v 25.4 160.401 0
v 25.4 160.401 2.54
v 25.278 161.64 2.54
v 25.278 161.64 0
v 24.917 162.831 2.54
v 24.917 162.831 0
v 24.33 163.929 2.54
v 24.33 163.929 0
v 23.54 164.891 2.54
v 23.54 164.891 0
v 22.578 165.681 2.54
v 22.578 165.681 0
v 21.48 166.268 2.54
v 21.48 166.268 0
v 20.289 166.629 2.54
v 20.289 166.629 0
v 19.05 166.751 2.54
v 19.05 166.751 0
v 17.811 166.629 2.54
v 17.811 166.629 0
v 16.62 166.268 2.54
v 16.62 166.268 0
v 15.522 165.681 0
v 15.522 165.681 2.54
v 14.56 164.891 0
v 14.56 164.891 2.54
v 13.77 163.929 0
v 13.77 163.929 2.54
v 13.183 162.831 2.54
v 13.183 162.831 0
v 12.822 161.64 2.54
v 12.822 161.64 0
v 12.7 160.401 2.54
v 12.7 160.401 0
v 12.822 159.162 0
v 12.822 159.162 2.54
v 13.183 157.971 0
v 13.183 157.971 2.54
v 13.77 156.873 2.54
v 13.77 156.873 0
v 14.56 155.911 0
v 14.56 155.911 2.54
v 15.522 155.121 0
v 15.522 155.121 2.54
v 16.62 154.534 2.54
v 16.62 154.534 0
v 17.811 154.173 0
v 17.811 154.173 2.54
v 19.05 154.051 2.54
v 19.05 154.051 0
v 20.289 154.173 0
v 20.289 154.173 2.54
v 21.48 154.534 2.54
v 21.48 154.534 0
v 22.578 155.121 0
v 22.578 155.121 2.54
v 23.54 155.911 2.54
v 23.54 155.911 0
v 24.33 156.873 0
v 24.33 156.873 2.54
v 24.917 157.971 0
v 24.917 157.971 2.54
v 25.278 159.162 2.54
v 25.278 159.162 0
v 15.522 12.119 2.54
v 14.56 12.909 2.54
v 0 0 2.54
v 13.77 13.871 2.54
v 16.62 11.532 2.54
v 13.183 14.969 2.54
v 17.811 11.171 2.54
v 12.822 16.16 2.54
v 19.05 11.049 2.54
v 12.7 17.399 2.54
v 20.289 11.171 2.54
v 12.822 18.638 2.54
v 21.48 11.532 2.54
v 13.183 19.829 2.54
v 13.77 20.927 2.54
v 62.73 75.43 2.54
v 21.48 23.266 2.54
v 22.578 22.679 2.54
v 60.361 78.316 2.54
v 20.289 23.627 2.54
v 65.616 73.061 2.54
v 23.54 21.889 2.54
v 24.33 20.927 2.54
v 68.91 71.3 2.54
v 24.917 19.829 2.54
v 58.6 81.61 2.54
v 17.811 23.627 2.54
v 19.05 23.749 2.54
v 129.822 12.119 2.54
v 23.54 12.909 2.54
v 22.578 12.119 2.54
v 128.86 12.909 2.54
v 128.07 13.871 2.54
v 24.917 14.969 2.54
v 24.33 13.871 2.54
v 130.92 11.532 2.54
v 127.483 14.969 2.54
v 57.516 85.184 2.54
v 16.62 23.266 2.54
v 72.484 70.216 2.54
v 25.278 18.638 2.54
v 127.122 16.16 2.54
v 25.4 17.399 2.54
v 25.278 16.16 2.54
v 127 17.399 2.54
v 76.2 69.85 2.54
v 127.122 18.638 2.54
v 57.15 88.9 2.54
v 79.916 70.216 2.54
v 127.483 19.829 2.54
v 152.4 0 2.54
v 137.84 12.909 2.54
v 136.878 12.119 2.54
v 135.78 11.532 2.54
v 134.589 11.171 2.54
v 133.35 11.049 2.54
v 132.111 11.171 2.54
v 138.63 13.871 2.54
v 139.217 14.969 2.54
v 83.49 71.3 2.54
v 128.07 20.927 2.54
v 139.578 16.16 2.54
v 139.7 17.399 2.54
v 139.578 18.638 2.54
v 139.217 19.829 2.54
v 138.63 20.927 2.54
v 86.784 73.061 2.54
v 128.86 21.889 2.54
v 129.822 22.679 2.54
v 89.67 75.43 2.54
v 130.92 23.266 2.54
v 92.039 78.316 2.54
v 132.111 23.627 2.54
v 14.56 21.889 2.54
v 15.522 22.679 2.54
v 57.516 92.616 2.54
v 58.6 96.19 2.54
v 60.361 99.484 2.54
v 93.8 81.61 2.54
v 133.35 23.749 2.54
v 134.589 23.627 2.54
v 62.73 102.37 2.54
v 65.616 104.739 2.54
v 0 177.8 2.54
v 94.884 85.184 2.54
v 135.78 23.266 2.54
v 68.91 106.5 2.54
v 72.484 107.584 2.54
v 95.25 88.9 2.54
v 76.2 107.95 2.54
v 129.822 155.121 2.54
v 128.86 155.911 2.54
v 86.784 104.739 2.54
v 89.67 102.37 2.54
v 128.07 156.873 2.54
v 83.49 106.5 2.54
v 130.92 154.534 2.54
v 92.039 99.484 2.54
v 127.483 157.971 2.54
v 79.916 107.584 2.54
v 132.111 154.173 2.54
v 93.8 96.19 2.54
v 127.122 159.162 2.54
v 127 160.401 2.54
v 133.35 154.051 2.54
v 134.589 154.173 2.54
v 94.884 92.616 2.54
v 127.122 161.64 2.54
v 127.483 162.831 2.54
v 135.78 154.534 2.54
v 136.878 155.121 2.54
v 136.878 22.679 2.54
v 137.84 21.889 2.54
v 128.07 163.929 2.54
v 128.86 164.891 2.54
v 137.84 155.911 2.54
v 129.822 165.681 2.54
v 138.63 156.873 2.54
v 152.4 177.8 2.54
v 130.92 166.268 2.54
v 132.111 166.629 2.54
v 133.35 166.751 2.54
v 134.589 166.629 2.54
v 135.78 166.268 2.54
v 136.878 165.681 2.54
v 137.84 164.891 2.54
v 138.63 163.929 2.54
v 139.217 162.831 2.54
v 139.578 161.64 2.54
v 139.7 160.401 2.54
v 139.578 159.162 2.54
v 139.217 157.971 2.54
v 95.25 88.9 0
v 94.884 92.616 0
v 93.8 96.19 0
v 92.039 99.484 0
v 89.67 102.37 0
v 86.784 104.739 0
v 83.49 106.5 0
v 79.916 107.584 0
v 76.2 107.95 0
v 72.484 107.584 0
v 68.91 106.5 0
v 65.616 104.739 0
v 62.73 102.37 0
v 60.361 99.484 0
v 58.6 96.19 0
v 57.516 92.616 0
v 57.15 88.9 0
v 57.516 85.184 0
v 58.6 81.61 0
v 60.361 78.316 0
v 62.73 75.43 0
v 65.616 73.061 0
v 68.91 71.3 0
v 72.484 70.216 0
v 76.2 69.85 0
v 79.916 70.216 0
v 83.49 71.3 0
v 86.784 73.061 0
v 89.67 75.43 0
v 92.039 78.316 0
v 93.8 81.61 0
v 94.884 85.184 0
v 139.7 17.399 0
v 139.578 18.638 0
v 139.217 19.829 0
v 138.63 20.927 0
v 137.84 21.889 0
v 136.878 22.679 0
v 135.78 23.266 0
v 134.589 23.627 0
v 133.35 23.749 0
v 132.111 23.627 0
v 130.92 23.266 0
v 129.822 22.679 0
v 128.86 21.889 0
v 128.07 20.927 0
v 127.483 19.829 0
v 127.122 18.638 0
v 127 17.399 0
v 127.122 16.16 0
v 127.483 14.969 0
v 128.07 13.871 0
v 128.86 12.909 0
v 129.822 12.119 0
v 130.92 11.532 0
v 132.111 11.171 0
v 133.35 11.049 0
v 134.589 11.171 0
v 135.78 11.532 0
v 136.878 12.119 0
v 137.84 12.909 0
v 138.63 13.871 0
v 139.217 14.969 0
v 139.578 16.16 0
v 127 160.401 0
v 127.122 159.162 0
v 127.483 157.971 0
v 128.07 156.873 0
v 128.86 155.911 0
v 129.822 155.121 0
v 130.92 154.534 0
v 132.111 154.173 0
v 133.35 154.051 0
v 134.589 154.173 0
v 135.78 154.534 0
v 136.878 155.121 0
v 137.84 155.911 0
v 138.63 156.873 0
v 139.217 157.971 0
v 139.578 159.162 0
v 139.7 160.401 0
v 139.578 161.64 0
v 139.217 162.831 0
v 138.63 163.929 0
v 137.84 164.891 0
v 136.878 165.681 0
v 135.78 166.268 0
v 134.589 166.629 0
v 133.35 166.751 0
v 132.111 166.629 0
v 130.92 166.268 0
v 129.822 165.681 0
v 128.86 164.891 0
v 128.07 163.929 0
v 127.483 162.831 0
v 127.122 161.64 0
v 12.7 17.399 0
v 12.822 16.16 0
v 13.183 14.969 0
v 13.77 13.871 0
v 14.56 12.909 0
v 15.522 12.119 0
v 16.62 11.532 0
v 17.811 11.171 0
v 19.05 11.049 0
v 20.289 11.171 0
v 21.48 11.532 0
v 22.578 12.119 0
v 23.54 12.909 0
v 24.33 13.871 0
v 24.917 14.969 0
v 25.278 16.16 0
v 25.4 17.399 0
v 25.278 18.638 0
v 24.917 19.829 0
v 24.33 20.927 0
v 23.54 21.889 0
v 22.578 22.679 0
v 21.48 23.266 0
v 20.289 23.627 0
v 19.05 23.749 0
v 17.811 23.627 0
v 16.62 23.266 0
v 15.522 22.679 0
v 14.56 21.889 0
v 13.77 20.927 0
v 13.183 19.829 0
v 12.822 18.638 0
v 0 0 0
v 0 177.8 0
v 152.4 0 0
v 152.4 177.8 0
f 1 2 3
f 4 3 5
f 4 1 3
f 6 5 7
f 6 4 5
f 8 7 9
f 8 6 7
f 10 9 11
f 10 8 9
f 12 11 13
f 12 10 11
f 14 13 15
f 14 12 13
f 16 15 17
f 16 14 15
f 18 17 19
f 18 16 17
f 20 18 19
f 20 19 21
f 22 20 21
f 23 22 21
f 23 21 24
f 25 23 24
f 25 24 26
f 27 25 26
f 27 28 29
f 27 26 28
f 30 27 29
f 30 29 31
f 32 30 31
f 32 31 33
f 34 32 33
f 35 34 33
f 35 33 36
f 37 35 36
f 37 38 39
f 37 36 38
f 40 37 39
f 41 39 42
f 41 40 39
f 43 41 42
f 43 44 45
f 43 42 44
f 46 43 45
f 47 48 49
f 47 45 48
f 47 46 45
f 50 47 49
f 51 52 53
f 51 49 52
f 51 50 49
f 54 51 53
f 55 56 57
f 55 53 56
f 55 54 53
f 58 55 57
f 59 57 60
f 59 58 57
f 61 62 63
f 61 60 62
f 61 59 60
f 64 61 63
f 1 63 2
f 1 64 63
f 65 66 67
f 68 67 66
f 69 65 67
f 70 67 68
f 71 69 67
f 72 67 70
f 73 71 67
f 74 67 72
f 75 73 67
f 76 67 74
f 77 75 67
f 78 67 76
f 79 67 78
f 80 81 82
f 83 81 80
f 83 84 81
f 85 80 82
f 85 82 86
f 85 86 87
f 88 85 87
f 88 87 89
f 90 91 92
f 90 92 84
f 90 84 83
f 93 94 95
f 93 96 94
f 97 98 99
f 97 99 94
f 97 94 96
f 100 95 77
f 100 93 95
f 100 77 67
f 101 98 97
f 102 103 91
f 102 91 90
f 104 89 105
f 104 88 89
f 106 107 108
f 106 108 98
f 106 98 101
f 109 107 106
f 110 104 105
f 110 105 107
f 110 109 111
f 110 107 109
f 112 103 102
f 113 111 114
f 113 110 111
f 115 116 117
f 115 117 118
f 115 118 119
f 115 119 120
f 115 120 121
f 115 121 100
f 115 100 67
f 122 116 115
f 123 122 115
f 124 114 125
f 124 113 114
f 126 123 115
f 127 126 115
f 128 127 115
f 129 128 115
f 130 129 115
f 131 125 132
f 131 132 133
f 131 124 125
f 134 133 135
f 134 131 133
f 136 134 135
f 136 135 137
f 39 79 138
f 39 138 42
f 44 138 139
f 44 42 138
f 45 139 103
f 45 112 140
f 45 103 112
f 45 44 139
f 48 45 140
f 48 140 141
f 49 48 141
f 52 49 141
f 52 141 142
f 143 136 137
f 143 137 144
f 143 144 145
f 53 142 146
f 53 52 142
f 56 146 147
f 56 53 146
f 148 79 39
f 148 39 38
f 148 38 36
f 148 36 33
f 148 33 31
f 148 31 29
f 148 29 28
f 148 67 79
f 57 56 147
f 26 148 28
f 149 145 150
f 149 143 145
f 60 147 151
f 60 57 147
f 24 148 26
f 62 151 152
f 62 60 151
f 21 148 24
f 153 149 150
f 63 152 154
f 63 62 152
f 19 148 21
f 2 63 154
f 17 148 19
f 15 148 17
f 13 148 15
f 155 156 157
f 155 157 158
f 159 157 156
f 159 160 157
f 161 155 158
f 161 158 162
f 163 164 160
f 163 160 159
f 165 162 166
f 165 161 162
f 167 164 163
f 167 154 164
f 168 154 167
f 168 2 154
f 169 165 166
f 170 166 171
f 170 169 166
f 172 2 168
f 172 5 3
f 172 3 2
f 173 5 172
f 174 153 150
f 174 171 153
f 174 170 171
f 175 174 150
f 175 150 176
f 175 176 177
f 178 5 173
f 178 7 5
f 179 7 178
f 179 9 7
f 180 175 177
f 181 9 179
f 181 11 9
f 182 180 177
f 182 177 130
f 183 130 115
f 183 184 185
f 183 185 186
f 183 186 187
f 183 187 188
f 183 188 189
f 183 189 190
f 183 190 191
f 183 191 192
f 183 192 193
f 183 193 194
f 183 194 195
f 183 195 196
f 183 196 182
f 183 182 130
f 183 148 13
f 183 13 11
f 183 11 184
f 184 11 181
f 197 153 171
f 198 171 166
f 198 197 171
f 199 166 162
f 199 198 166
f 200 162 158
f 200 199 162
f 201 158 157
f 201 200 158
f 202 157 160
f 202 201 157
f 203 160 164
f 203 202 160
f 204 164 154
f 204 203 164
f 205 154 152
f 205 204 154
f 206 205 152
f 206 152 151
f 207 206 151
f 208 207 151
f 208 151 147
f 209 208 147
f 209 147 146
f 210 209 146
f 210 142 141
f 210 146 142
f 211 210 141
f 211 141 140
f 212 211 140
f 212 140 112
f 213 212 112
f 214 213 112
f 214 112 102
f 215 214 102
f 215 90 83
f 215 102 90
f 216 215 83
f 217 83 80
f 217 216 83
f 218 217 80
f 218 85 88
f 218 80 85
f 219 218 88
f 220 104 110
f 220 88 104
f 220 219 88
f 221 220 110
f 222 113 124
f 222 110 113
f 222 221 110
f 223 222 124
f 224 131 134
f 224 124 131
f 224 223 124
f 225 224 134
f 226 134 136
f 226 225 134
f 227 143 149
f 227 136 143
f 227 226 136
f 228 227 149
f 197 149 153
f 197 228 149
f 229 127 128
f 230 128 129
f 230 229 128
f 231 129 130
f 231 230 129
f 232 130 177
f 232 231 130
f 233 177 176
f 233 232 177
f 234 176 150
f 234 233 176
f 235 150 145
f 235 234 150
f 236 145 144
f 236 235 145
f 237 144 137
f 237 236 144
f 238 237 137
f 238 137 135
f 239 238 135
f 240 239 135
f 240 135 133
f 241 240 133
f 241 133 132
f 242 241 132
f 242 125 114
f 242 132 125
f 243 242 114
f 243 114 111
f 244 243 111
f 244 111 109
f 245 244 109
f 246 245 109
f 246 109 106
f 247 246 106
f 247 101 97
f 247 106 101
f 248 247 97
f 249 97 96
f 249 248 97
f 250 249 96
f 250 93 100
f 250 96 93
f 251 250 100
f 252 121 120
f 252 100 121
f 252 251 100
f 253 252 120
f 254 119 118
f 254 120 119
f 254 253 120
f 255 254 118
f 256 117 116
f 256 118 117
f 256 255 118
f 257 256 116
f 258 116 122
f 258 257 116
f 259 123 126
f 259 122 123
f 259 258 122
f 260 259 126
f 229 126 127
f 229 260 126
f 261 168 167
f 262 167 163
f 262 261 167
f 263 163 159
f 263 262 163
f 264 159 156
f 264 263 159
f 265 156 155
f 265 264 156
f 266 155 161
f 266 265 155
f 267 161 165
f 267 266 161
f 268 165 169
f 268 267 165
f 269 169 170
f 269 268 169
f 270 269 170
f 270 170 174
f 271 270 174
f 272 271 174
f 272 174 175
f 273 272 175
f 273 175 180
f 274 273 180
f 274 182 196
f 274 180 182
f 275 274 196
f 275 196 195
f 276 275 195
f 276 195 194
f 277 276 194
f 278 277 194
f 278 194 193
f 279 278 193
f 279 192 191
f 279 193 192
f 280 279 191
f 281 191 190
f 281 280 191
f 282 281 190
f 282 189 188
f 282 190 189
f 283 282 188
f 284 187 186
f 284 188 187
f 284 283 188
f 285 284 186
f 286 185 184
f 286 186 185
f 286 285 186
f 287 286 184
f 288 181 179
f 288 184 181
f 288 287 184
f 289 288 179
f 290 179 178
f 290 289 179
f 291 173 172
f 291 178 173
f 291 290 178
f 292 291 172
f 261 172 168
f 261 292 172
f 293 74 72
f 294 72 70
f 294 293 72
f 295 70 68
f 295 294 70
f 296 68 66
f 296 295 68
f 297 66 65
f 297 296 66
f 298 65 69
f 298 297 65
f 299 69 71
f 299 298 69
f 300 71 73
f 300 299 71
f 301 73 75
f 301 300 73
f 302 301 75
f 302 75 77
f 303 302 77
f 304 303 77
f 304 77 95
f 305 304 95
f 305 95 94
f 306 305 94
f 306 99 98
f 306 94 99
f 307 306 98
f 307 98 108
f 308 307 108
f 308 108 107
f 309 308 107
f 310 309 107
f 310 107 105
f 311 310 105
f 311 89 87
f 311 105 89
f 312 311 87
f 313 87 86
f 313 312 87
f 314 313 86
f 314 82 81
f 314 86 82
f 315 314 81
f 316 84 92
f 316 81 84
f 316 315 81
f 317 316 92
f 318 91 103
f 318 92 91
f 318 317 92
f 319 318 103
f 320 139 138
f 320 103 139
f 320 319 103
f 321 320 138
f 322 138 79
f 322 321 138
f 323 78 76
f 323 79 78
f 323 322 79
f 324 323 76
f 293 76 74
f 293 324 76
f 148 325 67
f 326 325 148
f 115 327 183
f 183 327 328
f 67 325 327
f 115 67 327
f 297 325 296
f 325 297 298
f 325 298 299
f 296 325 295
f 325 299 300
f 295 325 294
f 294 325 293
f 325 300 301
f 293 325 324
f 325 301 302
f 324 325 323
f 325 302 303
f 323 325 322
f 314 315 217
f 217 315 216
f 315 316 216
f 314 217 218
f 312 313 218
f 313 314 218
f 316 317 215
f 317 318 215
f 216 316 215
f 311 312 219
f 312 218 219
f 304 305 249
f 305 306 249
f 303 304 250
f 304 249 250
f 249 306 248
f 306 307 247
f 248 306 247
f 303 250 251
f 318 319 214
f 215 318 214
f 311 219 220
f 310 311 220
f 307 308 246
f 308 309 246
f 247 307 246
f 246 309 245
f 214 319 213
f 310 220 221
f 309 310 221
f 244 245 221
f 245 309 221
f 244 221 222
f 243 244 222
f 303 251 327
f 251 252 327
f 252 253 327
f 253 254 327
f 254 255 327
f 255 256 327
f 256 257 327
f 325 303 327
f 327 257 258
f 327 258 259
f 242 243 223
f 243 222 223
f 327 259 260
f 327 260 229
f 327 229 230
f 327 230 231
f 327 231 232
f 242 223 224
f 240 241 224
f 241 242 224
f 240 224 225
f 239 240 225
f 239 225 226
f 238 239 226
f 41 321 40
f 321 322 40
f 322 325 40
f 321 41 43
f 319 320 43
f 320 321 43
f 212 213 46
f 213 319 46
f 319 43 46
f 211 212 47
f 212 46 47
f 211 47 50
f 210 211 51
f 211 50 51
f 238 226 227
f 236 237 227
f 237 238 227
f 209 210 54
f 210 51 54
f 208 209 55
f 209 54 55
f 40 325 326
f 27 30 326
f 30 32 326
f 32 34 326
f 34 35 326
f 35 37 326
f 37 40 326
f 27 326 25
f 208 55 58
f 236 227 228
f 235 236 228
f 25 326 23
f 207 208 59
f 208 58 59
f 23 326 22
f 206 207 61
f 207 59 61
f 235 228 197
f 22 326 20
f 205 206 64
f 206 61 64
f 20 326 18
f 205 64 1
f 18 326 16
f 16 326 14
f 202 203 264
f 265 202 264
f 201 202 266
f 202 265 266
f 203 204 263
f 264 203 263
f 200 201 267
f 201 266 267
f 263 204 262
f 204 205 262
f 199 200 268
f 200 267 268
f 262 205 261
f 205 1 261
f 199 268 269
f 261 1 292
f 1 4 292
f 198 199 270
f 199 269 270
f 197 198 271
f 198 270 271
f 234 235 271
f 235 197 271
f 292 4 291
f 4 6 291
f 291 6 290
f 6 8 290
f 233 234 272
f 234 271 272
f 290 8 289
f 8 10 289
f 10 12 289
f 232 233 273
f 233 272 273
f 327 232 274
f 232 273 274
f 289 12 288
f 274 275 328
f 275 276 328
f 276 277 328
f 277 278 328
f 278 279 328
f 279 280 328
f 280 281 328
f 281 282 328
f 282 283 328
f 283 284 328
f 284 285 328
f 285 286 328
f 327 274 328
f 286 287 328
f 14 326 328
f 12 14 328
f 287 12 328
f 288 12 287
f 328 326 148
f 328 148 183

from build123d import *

# Parameters (mm, degrees)
SKETCH1_W           = 152.4
SKETCH1_H           = 177.8
BOSS_EXTRUDE1_DEPTH = 2.54
SKETCH2_R           = 19.05
CUT_EXTRUDE1_DEPTH  = 235.190203894
SKETCH3_R           = 6.35
CUT_EXTRUDE3_DEPTH  = 235.190203894


with BuildPart() as part:
    # Sketch1 → Boss-Extrude1 (new body)
    with BuildSketch(Plane.XY):
        with Locations((76.2, 88.9)):
            Rectangle(SKETCH1_W, SKETCH1_H)
    extrude(amount=BOSS_EXTRUDE1_DEPTH)

    # Sketch2 → Cut-Extrude1 (cut, through all)
    with BuildSketch(Plane.XY):
        with Locations((76.2, 88.9)):
            Circle(SKETCH2_R)
    extrude(amount=CUT_EXTRUDE1_DEPTH, mode=Mode.SUBTRACT)

    # Sketch3 → Cut-Extrude3 (cut, through all)
    with BuildSketch(Plane.XY):
        with Locations((19.05, 160.401)):
            Circle(SKETCH3_R)
        with Locations(Location((133.35, 160.401, 0), (0, 0, 180))):
            Circle(SKETCH3_R)
        with Locations((133.35, 17.399)):
            Circle(SKETCH3_R)
        with Locations(Location((19.05, 17.399, 0), (0, 0, 180))):
            Circle(SKETCH3_R)
    extrude(amount=CUT_EXTRUDE3_DEPTH, mode=Mode.SUBTRACT)


solid = part.part
